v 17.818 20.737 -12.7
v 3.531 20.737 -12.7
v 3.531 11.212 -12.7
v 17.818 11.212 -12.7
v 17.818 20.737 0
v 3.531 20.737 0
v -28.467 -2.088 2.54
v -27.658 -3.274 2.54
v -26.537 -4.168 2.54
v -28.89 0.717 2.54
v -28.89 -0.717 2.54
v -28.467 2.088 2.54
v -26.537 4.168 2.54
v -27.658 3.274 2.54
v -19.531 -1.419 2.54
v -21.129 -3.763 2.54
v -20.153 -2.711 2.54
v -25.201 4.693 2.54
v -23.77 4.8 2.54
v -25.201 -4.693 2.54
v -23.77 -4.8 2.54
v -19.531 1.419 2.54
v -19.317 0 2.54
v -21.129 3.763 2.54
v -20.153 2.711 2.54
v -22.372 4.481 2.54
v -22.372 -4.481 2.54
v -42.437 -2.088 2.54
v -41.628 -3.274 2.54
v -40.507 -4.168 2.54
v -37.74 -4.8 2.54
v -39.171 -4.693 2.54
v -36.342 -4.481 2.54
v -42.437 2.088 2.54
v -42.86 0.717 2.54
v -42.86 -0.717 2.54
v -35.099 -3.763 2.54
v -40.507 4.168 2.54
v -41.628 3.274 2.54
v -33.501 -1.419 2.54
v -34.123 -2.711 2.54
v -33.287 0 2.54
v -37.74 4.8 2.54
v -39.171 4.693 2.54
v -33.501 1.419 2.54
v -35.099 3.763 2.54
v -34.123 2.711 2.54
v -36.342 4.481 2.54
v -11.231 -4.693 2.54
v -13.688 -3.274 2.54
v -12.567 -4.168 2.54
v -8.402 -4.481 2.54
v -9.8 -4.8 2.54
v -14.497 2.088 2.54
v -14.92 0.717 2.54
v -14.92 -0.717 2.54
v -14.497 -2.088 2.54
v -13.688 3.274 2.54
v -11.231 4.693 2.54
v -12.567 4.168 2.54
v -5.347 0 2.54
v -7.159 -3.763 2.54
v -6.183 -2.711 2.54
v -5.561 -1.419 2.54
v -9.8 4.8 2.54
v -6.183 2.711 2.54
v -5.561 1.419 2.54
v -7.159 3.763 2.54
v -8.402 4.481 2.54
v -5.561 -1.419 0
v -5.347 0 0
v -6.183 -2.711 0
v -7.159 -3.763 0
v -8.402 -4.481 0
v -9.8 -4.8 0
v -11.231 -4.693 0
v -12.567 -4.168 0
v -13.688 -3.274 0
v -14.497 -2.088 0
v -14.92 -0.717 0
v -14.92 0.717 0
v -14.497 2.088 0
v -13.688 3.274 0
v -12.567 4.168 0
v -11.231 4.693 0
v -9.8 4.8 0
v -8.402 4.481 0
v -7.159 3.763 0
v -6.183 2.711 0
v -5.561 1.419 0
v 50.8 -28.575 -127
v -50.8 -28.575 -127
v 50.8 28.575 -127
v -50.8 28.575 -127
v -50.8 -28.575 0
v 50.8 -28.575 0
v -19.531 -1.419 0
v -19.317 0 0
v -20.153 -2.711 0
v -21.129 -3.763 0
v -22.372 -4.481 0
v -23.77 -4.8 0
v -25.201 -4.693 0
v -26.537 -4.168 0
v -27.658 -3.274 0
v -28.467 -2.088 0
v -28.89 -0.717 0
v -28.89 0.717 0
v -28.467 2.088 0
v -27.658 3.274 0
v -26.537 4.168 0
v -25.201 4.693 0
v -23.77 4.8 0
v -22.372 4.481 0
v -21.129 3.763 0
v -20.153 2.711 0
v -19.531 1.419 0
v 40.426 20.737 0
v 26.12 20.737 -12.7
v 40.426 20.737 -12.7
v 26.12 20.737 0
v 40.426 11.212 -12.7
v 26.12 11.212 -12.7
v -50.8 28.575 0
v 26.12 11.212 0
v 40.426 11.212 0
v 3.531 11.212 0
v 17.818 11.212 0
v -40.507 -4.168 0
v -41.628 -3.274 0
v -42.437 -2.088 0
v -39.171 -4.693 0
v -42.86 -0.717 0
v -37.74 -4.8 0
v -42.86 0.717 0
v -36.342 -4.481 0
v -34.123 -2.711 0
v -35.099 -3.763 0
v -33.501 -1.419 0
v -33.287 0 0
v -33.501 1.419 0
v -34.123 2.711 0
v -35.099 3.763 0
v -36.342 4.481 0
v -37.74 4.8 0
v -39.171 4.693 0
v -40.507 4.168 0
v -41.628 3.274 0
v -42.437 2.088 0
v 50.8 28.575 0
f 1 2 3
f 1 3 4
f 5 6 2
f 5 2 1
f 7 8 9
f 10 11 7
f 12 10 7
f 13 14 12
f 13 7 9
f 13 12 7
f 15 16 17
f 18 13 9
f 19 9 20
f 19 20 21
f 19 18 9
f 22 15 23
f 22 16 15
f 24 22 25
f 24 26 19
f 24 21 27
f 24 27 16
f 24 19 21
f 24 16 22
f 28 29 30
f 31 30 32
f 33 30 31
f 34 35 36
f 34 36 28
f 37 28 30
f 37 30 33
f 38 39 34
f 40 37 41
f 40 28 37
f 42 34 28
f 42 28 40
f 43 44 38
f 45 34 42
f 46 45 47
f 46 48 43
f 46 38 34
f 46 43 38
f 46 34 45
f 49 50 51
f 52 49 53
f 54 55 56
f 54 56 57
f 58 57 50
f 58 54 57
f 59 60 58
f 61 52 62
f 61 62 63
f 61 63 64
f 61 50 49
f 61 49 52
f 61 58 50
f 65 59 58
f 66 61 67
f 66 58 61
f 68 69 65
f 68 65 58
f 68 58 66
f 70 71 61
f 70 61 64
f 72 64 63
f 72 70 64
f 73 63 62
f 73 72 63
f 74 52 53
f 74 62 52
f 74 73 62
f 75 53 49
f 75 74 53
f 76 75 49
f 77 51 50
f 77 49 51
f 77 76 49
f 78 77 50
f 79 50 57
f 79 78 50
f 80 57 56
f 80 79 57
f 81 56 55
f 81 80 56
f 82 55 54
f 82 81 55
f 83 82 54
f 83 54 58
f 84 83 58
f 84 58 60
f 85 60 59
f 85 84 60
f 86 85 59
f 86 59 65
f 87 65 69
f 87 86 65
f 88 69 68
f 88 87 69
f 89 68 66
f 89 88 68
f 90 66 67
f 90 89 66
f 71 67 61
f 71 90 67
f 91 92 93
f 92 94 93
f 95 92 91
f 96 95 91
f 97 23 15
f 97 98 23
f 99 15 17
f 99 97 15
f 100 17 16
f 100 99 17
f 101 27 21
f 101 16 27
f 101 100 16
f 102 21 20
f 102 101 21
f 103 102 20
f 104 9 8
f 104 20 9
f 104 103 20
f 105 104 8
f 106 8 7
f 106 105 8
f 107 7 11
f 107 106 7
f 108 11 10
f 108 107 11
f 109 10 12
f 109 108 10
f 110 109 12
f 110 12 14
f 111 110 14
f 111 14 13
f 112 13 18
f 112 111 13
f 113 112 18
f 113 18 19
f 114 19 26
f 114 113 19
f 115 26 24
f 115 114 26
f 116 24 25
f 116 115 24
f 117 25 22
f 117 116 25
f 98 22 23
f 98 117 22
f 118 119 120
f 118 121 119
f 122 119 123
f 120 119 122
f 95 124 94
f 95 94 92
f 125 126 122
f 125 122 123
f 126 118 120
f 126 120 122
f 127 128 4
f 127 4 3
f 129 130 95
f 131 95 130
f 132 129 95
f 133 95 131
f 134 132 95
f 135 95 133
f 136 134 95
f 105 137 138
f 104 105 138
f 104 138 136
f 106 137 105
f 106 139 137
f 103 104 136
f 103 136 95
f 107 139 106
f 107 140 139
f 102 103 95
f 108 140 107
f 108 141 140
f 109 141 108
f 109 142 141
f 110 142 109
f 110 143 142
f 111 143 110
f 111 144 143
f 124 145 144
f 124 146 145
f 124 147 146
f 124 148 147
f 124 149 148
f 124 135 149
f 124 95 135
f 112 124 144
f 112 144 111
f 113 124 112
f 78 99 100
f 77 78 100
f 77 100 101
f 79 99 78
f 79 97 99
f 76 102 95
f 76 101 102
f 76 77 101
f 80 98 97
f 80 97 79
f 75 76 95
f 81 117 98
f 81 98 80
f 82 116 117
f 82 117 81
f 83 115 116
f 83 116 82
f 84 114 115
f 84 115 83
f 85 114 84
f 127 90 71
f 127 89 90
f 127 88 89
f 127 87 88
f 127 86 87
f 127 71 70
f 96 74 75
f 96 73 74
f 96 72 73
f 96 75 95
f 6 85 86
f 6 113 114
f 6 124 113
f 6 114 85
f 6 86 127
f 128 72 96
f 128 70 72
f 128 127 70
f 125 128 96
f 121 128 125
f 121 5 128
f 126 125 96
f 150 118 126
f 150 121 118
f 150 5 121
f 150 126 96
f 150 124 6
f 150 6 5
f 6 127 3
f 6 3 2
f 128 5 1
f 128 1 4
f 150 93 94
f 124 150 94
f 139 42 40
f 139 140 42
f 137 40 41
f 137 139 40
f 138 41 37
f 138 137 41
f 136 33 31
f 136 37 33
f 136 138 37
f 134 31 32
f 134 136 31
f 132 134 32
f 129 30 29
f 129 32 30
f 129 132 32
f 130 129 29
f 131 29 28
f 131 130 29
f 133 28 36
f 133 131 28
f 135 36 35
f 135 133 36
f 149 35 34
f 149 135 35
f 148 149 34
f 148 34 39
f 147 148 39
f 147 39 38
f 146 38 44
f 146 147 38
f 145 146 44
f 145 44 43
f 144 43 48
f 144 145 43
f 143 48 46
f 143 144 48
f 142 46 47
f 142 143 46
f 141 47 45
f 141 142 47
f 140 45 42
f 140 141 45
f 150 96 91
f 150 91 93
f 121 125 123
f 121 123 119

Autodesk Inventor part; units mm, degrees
ref_plane "YZ Plane" through (0, 0, 0) normal (1, 0, 0) x (0, 1, 0)
ref_plane "XZ Plane" through (0, 0, 0) normal (0, 1, 0) x (-1, 0, 0)
ref_plane "XY Plane" through (0, 0, 0) normal (0, 0, 1) x (1, 0, 0)
sketch "Sketch1" plane through (0, 0, 0) normal (0, 0, 1) x (1, 0, 0)
  line L0 (-50.8, -28.575) -> (50.8, -28.575)
  line L1 (50.8, -28.575) -> (50.8, 28.575)
  line L2 (50.8, 28.575) -> (-50.8, 28.575)
  line L3 (-50.8, 28.575) -> (-50.8, -28.575)
  line L4 (-50.8, -28.575) -> (50.8, 28.575) construction
  line L5 (50.8, -28.575) -> (-50.8, 28.575) construction
  point P0 (0, 0)
  dimension "d0" = 101.6
  dimension "d1" = 57.15
extrude "WR-LEN" add sketch "Sketch1" against normal blind 127
sketch "Sketch2" plane through (0, 0, 0) normal (0, 0, 1) x (1, 0, 0)
  line L0 (3.5309, 20.7371) -> (17.8184, 20.7371)
  line L1 (17.8184, 20.7371) -> (17.8184, 11.2121)
  line L2 (17.8184, 11.2121) -> (3.5309, 11.2121)
  line L3 (3.5309, 11.2121) -> (3.5309, 20.7371)
  line L4 (3.5309, 20.7371) -> (17.8184, 11.2121) construction
  line L5 (17.8184, 20.7371) -> (3.5309, 11.2121) construction
  line L6 (26.1201, 20.7371) -> (40.4265, 20.7371)
  line L7 (40.4265, 20.7371) -> (40.4265, 11.2121)
  line L8 (40.4265, 11.2121) -> (26.1201, 11.2121)
  line L9 (26.1201, 11.2121) -> (26.1201, 20.7371)
  point P0 (0, 0)
  point P1 (10.6746, 15.9746)
  dimension "d4" = 9.525
  dimension "d5" = 14.2875
extrude "sfp ports" cut sketch "Sketch2" against normal blind 12.7
sketch "Sketch3" plane through (0, 0, 0) normal (0, 0, 1) x (1, 0, 0)
  circle A0 centre (-38.1, 0) radius 4.8133
  line L0 (-50.8, 28.575) -> (-50.8, -28.575) projected
  line L1 (50.8, 28.575) -> (-50.8, 28.575) projected
  circle A1 centre (-24.13, 0) radius 4.8133
  circle A2 centre (-10.16, 0) radius 4.8133
  point P0 (0, 0)
  dimension "d9" = 9.6266
  dimension "d10" = 12.7
  dimension "d11" = 28.575
  dimension "d14" = 13.97
extrude "Extrusion3" add sketch "Sketch3" along normal blind 2.54
properties part number "WR_LEN"
